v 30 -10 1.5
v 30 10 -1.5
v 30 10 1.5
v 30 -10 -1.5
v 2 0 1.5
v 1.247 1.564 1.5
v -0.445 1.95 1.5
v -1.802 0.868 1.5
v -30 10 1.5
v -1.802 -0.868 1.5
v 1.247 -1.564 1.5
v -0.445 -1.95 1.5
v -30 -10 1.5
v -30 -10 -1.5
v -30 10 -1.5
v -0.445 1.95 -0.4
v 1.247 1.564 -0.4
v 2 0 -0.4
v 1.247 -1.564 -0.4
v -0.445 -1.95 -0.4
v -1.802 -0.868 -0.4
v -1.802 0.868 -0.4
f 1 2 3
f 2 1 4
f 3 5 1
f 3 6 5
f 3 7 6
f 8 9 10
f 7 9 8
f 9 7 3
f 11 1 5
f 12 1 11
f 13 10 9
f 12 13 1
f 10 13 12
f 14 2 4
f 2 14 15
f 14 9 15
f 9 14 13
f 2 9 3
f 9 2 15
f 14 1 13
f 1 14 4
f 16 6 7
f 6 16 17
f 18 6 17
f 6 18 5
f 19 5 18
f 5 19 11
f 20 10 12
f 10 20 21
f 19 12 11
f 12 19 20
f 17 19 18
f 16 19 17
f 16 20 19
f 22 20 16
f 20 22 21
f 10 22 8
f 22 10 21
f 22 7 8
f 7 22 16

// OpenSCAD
// Placeholder starter.scad for Parametric Keychain
// Generated automatically to satisfy book links.
// Replace with real starter model when available.

// Simple keychain placeholder
difference() {
  translate([0,0,0])
    cube([60, 20, 3], center=true);
  translate([0,0,1.6])
    cylinder(h=4, r=2, center=true);
}
